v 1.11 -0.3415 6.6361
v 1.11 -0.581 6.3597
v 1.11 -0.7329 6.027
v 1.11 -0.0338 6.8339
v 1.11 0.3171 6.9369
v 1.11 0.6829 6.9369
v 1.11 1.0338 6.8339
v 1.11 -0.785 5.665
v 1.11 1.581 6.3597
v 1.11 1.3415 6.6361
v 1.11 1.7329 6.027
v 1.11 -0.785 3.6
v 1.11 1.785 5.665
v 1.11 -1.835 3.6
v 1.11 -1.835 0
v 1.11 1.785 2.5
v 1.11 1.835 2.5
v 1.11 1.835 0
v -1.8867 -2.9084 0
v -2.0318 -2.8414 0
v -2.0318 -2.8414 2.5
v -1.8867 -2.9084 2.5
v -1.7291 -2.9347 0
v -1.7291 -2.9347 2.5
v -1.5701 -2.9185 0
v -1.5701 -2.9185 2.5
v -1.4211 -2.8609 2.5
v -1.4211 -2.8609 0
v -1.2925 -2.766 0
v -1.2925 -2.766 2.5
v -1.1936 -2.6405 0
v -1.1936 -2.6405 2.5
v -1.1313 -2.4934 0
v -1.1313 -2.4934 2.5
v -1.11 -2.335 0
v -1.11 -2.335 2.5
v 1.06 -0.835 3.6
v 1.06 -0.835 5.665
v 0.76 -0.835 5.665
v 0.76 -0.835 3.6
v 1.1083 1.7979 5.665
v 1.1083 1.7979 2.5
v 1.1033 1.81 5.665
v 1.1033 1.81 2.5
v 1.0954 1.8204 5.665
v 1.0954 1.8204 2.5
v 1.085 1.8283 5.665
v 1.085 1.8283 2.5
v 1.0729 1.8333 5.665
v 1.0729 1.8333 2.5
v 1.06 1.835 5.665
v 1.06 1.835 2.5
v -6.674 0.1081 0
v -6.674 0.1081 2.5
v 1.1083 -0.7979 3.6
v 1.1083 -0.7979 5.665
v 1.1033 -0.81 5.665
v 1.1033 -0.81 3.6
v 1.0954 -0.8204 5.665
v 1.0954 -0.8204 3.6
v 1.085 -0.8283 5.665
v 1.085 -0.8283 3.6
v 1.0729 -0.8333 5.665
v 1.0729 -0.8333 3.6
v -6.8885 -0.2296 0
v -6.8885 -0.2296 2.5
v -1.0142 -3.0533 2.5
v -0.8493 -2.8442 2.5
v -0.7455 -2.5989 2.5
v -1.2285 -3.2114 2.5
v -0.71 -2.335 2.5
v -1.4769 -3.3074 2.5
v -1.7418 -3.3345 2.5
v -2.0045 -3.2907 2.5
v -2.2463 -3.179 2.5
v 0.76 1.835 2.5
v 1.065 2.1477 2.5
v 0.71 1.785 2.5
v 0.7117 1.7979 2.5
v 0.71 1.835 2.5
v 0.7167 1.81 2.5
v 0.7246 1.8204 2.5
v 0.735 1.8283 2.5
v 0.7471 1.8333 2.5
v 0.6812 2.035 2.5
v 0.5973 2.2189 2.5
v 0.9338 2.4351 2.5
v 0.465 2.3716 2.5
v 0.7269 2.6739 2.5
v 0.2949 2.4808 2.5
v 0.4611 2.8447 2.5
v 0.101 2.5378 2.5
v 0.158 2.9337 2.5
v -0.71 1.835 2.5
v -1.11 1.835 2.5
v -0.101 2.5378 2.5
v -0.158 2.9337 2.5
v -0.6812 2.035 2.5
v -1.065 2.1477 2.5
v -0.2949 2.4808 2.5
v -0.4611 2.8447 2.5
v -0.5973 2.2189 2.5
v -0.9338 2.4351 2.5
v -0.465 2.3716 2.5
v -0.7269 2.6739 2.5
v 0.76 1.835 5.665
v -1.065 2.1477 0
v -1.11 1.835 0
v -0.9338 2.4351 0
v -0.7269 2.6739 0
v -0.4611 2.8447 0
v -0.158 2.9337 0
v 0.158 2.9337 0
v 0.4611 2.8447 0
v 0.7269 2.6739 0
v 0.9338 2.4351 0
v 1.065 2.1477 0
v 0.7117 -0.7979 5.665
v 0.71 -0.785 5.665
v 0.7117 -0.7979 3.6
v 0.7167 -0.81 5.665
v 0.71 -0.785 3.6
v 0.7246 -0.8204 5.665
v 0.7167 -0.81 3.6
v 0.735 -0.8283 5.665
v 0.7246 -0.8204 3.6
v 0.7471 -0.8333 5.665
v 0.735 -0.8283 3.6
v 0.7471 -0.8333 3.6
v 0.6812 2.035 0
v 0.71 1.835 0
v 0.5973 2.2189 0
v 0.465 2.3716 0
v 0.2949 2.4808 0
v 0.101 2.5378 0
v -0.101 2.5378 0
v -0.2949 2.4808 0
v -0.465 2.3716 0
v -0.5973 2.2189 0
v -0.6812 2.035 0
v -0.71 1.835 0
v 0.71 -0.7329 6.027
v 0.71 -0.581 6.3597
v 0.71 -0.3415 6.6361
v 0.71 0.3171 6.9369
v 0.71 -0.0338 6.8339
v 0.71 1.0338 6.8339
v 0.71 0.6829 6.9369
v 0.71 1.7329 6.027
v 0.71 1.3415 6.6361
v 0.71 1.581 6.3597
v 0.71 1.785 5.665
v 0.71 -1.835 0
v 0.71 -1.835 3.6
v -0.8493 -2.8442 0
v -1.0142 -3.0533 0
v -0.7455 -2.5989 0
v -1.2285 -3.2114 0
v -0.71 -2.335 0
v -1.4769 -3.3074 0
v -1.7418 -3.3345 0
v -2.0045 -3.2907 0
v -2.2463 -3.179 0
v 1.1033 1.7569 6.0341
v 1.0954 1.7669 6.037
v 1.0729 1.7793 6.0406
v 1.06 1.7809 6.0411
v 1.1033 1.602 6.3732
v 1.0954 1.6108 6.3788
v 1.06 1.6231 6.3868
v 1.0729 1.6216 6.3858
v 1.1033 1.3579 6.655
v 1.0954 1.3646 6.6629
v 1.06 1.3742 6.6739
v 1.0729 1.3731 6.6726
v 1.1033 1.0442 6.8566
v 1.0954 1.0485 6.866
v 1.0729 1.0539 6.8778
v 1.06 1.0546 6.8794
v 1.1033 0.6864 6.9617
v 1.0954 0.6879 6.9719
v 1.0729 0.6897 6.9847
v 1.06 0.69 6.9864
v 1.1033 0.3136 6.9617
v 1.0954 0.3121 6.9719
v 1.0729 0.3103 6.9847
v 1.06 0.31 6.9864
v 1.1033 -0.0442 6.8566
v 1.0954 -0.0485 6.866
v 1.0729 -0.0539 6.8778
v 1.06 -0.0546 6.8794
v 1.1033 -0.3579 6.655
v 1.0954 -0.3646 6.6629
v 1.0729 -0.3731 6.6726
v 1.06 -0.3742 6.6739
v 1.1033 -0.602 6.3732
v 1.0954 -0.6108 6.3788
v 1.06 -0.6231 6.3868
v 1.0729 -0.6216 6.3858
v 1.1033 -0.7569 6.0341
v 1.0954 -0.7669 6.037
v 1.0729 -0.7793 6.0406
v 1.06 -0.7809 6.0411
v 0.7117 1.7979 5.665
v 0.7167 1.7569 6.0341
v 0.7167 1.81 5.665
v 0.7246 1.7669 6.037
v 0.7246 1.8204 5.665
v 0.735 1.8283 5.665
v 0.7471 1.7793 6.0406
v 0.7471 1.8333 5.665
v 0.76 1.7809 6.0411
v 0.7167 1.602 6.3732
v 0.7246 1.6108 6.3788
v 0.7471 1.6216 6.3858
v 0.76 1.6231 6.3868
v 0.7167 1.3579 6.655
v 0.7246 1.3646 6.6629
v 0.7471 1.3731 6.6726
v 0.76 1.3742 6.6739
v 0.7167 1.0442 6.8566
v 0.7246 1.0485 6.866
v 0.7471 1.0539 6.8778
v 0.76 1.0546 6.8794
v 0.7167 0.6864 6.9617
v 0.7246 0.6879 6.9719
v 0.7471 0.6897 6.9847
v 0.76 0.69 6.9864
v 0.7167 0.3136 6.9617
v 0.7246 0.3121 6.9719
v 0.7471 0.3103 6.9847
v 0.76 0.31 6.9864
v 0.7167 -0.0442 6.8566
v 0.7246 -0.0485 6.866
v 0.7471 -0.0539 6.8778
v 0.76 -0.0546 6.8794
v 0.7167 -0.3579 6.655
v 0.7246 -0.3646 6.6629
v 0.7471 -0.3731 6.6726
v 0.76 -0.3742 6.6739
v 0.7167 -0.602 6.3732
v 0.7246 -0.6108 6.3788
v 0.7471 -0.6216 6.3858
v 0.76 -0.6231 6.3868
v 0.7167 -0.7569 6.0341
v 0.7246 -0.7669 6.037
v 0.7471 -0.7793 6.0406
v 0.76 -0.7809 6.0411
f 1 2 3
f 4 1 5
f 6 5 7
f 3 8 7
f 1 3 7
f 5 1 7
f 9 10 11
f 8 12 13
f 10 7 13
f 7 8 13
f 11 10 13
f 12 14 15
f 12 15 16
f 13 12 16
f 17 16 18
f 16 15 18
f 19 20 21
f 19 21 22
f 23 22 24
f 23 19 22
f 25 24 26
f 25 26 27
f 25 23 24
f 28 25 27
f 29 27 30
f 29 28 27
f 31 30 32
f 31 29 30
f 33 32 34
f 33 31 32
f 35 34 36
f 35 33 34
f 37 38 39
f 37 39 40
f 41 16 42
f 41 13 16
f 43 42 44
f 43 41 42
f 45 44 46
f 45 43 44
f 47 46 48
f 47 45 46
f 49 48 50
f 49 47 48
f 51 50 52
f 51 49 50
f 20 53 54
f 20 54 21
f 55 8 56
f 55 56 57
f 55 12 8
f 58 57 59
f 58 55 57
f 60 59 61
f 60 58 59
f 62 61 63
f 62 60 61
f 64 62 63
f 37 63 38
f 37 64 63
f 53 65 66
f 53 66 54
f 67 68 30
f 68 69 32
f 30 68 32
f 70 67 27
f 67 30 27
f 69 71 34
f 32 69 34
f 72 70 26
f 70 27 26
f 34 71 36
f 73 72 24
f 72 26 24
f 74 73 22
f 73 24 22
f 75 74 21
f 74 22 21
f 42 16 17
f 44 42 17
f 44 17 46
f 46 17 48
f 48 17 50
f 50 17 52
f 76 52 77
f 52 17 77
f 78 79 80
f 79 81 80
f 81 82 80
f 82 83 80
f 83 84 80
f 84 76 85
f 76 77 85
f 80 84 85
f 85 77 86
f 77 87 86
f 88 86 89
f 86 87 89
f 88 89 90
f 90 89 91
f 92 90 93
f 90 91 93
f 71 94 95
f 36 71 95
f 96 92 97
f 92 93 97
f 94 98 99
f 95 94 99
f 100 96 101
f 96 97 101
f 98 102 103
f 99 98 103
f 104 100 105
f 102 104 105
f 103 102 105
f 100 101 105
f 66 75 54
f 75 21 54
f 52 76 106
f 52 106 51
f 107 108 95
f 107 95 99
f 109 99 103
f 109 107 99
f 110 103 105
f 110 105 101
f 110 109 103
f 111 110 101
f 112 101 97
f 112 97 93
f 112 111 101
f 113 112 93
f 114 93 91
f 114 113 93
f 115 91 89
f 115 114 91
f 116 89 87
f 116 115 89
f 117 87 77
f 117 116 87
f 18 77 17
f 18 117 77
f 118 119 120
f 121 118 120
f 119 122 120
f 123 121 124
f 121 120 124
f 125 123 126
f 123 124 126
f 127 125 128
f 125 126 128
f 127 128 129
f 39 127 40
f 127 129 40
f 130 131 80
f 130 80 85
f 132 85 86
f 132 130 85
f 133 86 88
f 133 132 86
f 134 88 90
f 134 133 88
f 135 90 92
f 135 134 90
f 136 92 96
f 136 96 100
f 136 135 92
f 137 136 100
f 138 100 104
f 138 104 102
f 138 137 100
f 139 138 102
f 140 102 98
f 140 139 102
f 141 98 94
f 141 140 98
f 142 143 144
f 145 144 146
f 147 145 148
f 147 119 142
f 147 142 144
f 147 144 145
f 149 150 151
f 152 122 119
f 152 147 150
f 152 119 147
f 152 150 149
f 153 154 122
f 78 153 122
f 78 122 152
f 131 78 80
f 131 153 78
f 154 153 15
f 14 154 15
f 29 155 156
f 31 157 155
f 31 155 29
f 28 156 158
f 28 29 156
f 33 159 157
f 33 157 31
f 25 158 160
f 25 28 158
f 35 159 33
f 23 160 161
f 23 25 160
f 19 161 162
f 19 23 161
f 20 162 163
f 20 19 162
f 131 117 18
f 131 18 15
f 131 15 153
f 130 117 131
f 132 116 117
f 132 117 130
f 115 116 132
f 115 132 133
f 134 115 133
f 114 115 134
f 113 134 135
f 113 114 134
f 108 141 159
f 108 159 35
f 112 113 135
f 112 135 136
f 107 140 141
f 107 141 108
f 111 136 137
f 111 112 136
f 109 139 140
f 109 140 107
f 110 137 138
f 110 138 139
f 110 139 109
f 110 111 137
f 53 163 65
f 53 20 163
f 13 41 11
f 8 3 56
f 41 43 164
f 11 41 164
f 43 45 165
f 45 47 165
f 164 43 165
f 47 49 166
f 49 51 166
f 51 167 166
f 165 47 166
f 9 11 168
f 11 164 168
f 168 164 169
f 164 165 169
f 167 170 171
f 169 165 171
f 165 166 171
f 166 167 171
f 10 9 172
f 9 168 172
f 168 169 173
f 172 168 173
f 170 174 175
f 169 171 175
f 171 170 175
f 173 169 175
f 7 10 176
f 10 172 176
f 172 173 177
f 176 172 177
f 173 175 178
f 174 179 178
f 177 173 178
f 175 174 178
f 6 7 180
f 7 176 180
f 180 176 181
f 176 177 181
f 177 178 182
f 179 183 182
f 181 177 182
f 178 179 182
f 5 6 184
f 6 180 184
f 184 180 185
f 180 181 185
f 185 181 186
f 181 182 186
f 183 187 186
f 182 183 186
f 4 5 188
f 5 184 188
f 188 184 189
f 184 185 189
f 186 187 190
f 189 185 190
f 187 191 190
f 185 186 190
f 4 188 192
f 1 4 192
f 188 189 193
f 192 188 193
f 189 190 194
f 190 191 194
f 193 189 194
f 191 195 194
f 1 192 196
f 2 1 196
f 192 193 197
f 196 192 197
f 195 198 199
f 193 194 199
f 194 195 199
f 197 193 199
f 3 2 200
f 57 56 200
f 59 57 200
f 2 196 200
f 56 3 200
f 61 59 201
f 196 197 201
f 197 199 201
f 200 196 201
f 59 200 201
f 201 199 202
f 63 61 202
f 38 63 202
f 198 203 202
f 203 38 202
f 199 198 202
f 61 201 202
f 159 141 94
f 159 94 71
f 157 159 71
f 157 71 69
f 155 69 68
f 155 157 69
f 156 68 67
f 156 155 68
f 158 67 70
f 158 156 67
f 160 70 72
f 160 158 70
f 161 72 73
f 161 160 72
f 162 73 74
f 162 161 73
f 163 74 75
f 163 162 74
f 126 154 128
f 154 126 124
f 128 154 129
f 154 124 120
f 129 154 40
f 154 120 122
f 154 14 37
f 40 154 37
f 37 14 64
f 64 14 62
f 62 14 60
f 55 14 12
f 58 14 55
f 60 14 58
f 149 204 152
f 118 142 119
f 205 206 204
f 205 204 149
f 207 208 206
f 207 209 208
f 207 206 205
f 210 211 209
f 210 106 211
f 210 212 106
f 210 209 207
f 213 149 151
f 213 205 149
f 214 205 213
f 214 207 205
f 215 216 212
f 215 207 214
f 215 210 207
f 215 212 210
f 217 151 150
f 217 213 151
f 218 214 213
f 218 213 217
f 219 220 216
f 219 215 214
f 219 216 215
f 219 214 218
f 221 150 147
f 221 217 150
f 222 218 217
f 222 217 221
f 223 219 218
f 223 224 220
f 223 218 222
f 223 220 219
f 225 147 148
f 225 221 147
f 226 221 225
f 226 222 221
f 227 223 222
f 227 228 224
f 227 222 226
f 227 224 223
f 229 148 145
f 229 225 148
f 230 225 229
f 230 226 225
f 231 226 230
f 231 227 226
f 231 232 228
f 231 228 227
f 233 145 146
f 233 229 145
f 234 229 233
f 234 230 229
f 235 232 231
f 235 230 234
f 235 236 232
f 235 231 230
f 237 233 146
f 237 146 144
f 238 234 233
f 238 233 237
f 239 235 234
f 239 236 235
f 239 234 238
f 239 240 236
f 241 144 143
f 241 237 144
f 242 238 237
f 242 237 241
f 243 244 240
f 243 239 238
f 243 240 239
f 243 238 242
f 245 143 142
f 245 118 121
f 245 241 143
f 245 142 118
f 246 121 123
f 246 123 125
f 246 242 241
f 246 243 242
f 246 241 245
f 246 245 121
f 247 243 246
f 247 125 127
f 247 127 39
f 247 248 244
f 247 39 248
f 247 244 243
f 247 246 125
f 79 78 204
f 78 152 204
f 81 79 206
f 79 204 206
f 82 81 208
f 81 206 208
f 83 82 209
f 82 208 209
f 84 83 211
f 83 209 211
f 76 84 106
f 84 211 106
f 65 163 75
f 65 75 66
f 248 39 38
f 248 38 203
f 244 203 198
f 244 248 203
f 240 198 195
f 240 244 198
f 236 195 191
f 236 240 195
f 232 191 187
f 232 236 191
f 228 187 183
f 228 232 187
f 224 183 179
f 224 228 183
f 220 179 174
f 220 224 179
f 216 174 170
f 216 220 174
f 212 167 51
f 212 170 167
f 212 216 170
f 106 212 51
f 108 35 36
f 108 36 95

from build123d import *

# Parameters (mm, degrees)
BASE_FLANGE1_DEPTH  = 2.5
SKETCH6_W           = 0.4
SKETCH6_H           = 3.67
BOSS_EXTRUDE1_DEPTH = 4.5
SKETCH8_W           = 3.4
SKETCH8_H           = 1
CUT_EXTRUDE1_DEPTH  = 4.5
FILLET1_RADIUS      = 1.335
FILLET1_LENGTH      = 0.4
FILLET2_R           = 0.05


# Sheet-metal steps are written as plain solids
with BuildPart() as part:
    # Sketch1 → Base-Flange1 (new body)
    with BuildSketch(Plane.XY):
        with BuildLine():
            Line((0.71, -1.835), (0.71, 1.835))
            ThreePointArc((0.71, 1.835), (0, 2.545), (-0.71, 1.835))
            Line((-0.71, 1.835), (-0.71, -1.835))
            Line((-0.71, -1.835), (-0.71, -2.335))
            ThreePointArc((-0.71, -2.335), (-1.228475759, -3.211432773), (-2.246268811, -3.179047252))
            Line((-2.246268811, -3.179047252), (-6.888528694, -0.229568793))
            Line((-6.888528694, -0.229568793), (-6.67402117, 0.108050107))
            Line((-6.67402117, 0.108050107), (-2.031761286, -2.841428351))
            ThreePointArc((-2.031761286, -2.841428351), (-1.421085455, -2.860859664), (-1.11, -2.335))
            Line((-1.11, -2.335), (-1.11, -1.835))
            Line((-1.11, -1.835), (-1.11, 1.835))
            ThreePointArc((-1.11, 1.835), (0, 2.945), (1.11, 1.835))
            Line((1.11, 1.835), (1.11, -1.835))
            Line((1.11, -1.835), (0.71, -1.835))
        make_face()
    extrude(amount=BASE_FLANGE1_DEPTH)

    # Sketch6 → Boss-Extrude1 (add)
    with BuildSketch(Plane.XY.offset(2.5)):
        with Locations((0.91, 0)):
            Rectangle(SKETCH6_W, SKETCH6_H)
    extrude(amount=BOSS_EXTRUDE1_DEPTH)

    # Sketch8 → Cut-Extrude1 (cut)
    with BuildSketch(Plane(origin=(1.11, 0, 0), x_dir=(0, 0, -1), z_dir=(1, 0, 0))):
        with Locations((-5.3, -1.335)):
            Rectangle(SKETCH8_W, SKETCH8_H)
    extrude(amount=-CUT_EXTRUDE1_DEPTH, mode=Mode.SUBTRACT)

    # Fillet1: full round fillet: the end face becomes a half cylinder, R = half its width
    fillet1_face = Plane((0.91, 0.5, 7), x_dir=(-1, 0, 0), z_dir=(0, 0, 1))  # on the end face: x along it, z out of the body
    fillet1_slab = fillet1_face.offset(-FILLET1_RADIUS / 2) * Box(FILLET1_LENGTH, 2 * FILLET1_RADIUS, FILLET1_RADIUS, mode=Mode.PRIVATE)  # the body's end, R deep
    fillet1_round = Plane((0.91, 0.5, 5.665), x_dir=(0, 0, 1), z_dir=(-1, 0, 0)) * Cylinder(FILLET1_RADIUS, FILLET1_LENGTH, mode=Mode.PRIVATE)  # its axis R under the face
    add(fillet1_slab - fillet1_round, mode=Mode.SUBTRACT)

    # Fillet2
    fillet2_edges = [part.edges().sort_by_distance(p)[0] for p in [
        (1.11, -0.835, 4.6325),
        (0.71, 1.835, 4.0825),
        (1.11, 1.835, 4.0825),
        (0.71, -0.835, 4.6325),
        (0.71, 0.5, 7),
        (1.11, 0.5, 7),
    ]]
    fillet(fillet2_edges, radius=FILLET2_R)


solid = part.part
